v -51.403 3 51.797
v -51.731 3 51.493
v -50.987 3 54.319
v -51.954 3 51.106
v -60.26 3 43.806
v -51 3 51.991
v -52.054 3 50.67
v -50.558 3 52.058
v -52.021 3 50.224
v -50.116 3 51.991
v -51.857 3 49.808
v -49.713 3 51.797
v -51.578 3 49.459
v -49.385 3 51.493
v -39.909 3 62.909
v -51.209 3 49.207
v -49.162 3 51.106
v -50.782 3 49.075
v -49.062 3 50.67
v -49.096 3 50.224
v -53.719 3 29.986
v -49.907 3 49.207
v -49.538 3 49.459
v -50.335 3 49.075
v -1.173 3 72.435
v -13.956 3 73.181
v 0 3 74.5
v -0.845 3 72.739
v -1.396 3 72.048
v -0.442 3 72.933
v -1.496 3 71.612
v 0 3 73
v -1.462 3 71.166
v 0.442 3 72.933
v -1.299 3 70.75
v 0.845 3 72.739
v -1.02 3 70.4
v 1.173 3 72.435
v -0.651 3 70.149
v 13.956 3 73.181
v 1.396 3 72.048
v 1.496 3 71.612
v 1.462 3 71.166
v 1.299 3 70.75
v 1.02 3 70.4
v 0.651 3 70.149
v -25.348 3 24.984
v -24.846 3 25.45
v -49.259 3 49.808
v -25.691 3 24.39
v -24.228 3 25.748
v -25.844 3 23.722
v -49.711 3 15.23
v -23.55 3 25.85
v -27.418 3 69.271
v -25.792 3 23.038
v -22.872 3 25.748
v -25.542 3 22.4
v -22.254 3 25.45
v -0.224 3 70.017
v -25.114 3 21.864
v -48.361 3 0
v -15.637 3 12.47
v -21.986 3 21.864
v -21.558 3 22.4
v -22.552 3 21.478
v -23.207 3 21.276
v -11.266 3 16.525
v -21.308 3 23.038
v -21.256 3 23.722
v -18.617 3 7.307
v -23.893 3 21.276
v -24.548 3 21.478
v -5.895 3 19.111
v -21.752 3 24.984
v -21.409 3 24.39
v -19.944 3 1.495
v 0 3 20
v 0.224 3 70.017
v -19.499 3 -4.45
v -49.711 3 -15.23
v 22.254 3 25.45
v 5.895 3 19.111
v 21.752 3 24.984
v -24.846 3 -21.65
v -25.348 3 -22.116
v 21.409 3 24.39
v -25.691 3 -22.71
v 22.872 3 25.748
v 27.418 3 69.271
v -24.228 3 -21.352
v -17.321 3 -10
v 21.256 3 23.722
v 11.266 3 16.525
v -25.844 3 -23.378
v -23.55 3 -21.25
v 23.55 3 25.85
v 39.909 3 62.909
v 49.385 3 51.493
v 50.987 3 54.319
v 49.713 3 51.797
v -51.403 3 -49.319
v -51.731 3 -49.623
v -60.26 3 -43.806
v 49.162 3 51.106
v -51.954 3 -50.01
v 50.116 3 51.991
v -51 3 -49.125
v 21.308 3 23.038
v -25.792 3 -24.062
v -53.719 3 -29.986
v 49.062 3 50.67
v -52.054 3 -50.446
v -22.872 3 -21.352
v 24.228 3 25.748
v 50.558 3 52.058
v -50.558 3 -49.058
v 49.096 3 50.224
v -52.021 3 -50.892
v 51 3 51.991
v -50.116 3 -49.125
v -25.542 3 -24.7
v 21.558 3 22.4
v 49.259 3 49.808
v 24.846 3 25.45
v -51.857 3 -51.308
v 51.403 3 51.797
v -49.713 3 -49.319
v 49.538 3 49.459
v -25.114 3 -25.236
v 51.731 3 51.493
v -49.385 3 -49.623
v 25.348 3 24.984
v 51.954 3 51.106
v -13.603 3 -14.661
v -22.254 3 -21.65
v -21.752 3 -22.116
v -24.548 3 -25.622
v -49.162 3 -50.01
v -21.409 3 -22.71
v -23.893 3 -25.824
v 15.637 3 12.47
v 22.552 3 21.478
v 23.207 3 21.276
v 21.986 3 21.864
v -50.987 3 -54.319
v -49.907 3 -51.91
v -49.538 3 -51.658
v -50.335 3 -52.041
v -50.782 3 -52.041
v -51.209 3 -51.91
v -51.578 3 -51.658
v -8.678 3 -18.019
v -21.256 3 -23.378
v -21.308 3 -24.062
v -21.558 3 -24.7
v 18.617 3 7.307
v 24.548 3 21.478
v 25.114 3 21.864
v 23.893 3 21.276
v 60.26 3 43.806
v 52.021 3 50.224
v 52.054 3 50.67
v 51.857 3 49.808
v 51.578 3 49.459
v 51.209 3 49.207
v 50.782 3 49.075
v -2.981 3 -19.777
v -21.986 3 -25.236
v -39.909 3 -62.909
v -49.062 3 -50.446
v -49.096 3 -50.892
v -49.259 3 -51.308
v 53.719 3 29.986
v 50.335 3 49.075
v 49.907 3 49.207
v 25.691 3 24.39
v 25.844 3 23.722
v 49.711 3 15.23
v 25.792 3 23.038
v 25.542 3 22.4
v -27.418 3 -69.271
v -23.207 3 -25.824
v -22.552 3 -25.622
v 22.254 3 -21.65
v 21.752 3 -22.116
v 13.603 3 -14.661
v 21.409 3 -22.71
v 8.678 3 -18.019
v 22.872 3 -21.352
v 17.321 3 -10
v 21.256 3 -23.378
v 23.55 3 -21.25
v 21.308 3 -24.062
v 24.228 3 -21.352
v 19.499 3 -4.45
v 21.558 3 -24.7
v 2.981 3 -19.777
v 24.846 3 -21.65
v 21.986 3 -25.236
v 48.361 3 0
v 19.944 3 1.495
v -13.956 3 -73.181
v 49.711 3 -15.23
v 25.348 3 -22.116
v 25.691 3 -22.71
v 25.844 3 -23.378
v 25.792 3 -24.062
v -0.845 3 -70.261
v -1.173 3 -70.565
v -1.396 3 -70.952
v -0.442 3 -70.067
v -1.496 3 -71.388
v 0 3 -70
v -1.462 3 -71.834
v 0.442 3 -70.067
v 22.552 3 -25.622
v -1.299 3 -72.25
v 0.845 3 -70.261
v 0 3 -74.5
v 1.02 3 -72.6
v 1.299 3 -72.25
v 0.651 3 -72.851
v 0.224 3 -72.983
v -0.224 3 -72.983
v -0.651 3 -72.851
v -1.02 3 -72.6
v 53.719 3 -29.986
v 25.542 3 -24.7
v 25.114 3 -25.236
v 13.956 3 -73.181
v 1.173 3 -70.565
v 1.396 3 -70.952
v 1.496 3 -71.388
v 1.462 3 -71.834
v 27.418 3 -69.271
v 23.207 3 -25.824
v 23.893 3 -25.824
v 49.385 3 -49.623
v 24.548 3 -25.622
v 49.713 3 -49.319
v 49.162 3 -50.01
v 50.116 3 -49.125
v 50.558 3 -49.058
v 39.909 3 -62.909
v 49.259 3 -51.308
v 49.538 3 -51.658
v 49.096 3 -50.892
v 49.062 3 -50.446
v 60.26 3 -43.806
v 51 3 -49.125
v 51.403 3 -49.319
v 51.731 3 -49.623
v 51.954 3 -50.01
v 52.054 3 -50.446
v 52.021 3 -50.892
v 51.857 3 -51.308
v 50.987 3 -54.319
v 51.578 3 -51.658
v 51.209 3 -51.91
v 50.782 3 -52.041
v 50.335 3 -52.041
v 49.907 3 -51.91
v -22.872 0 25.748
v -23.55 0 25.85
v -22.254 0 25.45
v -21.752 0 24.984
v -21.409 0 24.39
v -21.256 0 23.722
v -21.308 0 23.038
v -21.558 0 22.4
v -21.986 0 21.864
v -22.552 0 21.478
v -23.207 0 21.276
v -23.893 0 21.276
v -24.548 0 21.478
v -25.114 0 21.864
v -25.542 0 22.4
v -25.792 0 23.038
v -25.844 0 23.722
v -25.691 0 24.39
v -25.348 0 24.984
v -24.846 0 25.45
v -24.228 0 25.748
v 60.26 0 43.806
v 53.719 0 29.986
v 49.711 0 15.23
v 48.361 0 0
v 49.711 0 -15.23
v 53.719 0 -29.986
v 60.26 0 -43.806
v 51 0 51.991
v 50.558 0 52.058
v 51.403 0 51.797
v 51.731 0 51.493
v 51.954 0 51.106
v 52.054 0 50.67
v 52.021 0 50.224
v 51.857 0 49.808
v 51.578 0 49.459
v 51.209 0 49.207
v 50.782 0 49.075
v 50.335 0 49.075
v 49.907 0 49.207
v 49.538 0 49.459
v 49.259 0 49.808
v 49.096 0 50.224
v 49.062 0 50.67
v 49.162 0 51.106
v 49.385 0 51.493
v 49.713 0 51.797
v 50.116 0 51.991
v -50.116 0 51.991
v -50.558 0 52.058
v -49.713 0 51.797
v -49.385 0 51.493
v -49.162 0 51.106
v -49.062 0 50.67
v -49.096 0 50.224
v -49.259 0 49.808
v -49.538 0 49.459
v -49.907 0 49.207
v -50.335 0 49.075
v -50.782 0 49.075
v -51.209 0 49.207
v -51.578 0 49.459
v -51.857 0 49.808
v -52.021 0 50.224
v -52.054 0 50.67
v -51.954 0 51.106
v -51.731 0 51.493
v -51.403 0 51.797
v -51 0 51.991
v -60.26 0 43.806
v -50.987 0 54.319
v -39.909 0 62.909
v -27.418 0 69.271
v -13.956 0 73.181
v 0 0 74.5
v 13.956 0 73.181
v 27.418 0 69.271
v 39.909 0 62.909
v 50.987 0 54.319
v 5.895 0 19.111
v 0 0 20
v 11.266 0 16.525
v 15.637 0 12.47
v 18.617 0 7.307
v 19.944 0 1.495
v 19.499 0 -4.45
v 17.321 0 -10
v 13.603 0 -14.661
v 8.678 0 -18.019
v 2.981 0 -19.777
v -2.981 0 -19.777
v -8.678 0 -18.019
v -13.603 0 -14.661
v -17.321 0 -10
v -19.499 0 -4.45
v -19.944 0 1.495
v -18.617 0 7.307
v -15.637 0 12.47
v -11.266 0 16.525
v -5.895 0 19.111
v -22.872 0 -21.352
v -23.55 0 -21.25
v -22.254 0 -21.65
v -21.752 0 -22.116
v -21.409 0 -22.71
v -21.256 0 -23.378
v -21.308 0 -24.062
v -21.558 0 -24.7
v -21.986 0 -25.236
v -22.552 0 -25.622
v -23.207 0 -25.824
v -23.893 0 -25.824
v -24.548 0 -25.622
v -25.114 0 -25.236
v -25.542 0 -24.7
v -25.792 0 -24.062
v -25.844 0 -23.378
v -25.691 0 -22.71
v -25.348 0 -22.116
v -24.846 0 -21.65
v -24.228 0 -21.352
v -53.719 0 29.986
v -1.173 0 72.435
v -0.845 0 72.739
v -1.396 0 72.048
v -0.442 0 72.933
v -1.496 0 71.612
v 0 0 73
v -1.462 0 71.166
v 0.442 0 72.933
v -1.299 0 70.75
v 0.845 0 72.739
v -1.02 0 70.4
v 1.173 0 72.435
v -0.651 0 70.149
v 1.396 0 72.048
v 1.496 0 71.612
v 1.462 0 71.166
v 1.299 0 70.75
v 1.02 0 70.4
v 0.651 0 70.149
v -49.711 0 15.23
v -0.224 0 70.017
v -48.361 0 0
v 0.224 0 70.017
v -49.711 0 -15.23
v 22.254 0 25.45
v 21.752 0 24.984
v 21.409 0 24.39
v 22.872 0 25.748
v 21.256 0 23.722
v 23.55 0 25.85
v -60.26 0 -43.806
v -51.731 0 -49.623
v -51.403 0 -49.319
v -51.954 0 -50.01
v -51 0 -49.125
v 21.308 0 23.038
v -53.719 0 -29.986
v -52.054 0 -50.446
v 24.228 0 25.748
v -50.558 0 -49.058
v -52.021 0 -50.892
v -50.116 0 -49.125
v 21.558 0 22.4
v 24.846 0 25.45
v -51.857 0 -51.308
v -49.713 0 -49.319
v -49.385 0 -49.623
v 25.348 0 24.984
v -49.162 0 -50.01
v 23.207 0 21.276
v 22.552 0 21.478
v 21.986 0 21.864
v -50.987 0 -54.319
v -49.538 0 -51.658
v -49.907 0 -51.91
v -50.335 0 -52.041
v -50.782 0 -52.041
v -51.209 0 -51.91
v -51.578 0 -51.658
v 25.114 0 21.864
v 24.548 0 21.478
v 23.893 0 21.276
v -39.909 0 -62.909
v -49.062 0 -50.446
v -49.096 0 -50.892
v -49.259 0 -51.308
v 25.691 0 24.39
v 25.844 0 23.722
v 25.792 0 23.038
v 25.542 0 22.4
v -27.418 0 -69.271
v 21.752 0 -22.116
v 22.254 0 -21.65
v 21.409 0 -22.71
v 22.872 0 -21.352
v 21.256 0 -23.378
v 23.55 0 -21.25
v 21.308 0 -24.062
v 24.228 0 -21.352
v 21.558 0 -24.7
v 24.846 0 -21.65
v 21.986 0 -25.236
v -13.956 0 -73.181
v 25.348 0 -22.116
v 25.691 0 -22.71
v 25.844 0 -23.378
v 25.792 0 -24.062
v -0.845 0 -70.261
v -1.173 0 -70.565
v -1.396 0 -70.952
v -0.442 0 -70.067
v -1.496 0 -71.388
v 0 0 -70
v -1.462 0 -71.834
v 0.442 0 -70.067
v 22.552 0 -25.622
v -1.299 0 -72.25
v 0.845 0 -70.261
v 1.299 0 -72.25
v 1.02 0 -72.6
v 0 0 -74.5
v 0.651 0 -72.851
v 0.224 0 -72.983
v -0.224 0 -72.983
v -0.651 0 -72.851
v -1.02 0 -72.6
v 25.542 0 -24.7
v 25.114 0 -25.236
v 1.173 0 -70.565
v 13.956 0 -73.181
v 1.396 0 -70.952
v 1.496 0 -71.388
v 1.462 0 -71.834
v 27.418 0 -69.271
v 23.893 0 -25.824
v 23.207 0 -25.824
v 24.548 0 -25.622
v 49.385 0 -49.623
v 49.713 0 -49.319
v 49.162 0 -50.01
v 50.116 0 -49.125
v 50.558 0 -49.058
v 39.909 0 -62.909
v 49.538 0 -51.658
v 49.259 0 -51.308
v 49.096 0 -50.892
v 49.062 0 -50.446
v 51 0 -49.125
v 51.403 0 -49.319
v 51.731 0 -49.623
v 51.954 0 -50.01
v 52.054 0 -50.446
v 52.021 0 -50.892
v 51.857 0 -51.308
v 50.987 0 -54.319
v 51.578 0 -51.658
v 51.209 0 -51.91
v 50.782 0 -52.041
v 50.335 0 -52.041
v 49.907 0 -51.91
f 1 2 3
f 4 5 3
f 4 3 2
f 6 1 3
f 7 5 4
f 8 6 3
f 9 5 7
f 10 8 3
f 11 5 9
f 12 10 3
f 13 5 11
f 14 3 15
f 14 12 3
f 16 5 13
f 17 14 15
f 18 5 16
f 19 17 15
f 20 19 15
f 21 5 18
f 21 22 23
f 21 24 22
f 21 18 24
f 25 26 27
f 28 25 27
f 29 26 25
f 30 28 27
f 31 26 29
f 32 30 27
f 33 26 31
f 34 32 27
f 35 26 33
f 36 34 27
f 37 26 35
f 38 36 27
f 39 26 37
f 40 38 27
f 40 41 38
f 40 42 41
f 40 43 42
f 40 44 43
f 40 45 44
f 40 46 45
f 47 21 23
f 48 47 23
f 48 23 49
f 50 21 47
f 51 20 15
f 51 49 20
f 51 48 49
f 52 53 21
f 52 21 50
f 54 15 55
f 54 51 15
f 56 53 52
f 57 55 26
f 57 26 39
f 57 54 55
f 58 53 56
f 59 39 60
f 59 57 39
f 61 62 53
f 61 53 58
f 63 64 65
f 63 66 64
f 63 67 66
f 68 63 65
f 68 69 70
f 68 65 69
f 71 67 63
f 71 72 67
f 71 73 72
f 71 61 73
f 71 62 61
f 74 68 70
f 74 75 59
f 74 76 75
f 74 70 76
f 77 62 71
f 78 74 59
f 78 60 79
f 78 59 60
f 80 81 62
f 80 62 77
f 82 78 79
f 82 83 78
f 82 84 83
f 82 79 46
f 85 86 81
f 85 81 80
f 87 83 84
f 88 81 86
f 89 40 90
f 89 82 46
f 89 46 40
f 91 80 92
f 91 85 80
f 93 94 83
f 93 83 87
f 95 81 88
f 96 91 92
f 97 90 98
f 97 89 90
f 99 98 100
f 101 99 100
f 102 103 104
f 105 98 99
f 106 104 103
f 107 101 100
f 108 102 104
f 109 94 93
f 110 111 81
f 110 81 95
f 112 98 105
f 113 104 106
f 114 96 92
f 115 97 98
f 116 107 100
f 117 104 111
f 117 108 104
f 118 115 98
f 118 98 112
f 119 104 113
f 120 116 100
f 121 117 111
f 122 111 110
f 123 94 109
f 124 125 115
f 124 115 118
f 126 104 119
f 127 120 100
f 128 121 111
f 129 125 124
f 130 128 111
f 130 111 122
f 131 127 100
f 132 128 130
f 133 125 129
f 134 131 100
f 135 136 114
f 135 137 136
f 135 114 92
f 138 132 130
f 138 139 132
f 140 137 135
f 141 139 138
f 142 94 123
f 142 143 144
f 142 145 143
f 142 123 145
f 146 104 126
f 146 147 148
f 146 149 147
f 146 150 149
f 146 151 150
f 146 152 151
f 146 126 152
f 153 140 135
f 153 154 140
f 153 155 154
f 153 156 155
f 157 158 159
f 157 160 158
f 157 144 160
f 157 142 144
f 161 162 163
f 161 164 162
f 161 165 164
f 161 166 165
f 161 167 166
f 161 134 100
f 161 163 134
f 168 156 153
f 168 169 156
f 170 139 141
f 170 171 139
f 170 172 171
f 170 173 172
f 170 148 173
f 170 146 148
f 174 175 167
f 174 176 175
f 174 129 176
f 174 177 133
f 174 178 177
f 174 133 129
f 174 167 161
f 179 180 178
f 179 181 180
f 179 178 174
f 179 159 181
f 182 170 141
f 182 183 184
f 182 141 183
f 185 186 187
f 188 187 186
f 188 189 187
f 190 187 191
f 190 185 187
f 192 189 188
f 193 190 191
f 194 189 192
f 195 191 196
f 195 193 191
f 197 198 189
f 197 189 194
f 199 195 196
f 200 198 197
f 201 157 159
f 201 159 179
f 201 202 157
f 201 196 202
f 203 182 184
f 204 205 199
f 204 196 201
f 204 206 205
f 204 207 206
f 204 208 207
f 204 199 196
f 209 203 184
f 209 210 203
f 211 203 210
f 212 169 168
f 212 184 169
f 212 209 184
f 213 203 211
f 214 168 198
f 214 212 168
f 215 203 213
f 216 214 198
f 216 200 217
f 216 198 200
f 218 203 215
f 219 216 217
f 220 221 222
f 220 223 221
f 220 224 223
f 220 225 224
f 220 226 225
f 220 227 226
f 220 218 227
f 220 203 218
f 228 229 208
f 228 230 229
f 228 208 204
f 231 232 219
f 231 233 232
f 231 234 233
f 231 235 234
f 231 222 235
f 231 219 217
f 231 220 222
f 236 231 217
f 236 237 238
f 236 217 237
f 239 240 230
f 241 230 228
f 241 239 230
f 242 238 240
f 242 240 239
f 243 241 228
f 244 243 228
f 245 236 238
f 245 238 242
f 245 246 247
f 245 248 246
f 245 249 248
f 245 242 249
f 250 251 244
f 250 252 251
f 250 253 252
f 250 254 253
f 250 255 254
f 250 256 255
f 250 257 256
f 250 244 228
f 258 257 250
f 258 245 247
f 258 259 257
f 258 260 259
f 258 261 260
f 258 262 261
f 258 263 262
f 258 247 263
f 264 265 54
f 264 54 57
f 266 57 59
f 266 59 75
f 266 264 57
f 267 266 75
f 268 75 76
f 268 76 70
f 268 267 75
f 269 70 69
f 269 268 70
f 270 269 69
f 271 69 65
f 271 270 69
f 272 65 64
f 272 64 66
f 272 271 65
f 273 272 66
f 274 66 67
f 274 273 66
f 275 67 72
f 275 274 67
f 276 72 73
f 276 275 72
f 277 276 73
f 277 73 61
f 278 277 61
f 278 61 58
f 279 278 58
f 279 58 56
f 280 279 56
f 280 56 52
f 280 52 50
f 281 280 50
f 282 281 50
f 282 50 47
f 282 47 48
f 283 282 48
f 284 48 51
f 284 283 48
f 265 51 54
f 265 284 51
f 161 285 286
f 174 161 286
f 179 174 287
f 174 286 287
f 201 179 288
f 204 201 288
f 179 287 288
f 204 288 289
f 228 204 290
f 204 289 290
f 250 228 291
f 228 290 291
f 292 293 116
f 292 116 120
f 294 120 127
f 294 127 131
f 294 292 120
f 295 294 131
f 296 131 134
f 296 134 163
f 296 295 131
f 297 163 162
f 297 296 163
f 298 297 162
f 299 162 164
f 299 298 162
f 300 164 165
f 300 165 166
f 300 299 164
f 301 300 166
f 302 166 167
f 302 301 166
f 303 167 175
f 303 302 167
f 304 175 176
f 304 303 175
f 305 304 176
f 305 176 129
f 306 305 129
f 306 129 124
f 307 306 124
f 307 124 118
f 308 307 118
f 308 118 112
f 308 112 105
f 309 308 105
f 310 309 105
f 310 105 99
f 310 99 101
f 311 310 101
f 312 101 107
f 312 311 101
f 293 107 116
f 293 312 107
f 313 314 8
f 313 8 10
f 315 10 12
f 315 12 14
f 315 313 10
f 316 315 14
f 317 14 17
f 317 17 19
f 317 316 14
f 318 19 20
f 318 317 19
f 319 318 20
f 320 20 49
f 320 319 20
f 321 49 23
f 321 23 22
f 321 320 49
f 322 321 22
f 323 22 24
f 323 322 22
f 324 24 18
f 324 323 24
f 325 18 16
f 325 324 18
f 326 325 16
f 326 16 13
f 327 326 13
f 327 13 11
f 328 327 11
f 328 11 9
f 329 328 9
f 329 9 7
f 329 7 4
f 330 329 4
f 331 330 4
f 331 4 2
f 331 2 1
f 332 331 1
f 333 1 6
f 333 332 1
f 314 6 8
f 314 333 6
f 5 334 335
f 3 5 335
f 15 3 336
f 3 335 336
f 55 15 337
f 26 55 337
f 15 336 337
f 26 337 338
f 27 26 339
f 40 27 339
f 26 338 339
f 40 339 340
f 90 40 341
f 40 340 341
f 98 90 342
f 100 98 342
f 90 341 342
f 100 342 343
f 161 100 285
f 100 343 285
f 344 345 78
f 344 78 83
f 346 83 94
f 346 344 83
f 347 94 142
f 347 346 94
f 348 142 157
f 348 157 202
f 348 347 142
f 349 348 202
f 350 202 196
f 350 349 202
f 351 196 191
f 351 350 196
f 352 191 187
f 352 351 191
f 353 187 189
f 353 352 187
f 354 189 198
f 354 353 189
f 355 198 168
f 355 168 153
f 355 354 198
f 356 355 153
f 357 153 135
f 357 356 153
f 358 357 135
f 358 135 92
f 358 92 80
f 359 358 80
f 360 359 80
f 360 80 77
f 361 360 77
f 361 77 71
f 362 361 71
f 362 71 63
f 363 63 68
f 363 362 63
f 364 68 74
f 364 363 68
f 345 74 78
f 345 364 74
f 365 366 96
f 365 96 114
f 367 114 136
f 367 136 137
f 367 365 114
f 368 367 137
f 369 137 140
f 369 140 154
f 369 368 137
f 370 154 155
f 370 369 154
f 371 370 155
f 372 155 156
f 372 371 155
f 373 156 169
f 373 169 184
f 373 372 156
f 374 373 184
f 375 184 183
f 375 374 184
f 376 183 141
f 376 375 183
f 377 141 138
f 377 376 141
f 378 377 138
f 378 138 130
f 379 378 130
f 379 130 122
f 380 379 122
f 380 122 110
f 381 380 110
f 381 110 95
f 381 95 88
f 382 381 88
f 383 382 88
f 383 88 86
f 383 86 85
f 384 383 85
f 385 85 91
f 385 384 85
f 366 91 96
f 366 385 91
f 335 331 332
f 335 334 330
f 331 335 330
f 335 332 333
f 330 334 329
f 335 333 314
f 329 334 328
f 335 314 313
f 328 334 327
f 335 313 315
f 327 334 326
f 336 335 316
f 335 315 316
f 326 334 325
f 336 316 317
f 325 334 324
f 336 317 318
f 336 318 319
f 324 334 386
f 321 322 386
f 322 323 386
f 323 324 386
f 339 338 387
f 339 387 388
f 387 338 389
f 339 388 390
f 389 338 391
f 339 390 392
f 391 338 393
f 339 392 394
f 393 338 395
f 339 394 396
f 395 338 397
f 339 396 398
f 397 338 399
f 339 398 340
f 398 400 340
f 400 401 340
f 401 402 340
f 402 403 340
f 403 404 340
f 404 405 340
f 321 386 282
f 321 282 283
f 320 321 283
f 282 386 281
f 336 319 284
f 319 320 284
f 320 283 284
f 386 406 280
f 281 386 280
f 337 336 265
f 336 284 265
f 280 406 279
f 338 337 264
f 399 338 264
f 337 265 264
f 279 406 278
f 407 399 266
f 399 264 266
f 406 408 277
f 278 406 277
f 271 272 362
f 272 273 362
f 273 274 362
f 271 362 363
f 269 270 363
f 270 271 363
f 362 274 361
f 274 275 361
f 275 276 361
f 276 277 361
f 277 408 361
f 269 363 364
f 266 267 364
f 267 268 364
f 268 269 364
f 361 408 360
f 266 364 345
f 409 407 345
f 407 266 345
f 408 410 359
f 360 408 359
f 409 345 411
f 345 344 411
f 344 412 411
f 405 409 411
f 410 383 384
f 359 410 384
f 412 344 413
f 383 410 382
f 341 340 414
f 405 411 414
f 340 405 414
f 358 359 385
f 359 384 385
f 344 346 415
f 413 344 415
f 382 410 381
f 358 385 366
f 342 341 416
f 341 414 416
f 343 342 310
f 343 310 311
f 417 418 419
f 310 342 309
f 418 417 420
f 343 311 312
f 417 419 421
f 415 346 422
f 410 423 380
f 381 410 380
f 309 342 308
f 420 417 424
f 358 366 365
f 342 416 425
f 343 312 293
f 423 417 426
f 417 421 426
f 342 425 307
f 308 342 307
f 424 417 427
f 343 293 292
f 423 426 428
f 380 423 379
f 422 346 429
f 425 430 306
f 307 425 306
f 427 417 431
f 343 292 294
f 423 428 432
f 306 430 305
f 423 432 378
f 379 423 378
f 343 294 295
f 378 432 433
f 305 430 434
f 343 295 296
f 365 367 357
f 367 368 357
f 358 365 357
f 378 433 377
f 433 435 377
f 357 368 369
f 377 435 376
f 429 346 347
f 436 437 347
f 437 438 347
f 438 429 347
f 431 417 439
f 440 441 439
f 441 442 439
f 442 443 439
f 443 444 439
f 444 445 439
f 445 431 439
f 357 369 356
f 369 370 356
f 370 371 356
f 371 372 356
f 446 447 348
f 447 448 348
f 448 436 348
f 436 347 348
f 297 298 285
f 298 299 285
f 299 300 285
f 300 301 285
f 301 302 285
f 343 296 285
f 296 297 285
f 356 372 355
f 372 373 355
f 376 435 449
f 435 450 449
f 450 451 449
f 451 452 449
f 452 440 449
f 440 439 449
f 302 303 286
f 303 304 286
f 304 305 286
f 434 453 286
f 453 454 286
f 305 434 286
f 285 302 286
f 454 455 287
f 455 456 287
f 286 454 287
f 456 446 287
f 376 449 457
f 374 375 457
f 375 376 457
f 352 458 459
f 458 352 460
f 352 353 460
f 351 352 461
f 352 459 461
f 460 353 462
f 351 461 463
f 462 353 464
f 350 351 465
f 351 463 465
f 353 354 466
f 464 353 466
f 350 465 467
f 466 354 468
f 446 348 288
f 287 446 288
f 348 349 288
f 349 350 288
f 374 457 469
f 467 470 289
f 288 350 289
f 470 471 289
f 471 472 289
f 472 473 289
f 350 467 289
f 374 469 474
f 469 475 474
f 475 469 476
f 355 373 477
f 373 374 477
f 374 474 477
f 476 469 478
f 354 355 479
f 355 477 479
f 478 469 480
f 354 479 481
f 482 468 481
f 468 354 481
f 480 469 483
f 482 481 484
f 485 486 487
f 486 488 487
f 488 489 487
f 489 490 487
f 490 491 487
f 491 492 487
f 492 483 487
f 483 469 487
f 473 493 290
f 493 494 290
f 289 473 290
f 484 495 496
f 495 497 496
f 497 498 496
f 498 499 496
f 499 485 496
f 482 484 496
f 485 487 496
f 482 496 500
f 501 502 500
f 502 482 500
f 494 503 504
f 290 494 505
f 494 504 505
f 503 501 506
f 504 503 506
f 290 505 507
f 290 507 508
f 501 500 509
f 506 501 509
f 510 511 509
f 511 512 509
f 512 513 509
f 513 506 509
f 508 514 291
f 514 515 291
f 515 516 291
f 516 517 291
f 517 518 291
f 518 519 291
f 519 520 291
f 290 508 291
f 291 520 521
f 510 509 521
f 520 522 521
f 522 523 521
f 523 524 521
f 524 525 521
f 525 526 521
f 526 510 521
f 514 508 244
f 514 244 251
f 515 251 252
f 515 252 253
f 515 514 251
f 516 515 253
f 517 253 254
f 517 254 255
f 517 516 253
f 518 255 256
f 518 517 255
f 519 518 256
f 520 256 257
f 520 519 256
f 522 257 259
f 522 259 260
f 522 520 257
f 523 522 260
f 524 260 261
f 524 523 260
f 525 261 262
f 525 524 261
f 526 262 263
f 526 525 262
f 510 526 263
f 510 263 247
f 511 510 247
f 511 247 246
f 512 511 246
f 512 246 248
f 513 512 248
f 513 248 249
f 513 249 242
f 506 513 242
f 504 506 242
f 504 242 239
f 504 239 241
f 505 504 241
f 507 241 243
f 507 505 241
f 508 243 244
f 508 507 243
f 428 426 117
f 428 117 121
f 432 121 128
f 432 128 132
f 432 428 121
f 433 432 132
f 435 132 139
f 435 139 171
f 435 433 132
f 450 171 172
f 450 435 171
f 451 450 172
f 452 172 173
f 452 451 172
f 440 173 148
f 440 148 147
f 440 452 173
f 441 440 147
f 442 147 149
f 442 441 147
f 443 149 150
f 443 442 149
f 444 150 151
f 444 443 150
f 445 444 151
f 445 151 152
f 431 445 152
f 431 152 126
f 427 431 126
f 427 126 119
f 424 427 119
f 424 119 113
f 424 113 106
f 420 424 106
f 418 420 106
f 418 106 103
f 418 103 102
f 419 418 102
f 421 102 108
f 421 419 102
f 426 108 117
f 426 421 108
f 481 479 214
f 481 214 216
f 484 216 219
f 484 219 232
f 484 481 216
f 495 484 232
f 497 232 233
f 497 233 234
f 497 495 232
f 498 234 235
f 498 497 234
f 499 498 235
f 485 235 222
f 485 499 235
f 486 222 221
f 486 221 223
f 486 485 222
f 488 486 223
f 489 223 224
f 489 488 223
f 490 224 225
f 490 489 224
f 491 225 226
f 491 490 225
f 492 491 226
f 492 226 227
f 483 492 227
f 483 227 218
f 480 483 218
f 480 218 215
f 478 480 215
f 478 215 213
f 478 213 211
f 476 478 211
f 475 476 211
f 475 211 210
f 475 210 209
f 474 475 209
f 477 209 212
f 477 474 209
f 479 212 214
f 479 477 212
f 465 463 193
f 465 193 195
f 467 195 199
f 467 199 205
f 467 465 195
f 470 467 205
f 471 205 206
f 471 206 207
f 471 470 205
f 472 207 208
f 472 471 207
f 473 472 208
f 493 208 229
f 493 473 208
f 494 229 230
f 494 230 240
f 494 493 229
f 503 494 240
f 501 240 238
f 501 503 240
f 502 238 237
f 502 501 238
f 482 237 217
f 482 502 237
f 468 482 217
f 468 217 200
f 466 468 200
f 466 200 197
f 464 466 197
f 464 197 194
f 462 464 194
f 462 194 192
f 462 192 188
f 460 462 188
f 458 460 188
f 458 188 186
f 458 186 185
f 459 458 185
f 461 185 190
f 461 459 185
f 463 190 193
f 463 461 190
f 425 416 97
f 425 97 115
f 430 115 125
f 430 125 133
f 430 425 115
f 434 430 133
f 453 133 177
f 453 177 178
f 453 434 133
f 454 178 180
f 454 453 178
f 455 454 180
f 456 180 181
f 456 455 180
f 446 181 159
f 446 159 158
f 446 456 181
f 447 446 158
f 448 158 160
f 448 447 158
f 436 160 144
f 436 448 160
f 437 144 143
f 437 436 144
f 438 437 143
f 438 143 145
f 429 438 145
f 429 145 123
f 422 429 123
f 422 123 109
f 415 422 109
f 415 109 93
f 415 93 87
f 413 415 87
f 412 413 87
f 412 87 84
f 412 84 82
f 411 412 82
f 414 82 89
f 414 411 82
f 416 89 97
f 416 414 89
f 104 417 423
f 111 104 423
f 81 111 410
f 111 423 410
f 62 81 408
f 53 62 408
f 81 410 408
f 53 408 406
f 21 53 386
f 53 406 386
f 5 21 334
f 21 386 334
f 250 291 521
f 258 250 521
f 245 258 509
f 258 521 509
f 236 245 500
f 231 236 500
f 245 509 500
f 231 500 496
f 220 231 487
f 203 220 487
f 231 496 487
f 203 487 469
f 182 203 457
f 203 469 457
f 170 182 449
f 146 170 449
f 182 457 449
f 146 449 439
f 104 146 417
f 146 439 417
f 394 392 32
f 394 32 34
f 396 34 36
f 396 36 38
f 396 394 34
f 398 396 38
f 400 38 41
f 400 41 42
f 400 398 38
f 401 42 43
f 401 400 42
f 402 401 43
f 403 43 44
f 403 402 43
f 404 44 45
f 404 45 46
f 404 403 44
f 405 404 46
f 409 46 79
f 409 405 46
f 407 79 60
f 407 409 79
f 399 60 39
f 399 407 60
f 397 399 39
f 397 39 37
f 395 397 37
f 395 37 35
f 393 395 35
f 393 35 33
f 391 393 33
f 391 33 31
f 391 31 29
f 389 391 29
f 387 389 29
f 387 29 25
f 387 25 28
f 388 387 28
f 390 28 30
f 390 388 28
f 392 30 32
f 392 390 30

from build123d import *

# Parameters (mm, degrees)
SKETCH_2_R      = 1.5
SKETCH_2_R_2    = 20
SKETCH_2_R_3    = 2.3
EXTRUDE_1_DEPTH = 3


with BuildPart() as part:
    # 草图2 → 凸台-拉伸1 (new body)
    with BuildSketch(Plane(origin=(0, 0, 0), x_dir=(1, 0, 0), z_dir=(0, 1, 0))):
        with BuildLine():
            ThreePointArc((60.260378076, 43.805671256), (0, 74.5), (-60.260378076, 43.805671256))
            ThreePointArc((-60.260378076, 43.805671256), (-48.360726818, 0), (-60.260378076, -43.805671256))
            ThreePointArc((-60.260378076, -43.805671256), (0, -74.5), (60.260378076, -43.805671256))
            ThreePointArc((60.260378076, -43.805671256), (48.360726818, 0), (60.260378076, 43.805671256))
        make_face()
        with Locations(Location((0, 71.5, 0), (0, 0, 270))):
            Circle(SKETCH_2_R, mode=Mode.SUBTRACT)
        with Locations(Location((50.558134855, 50.558134855, 0), (0, 0, 270))):
            Circle(SKETCH_2_R, mode=Mode.SUBTRACT)
        with Locations(Location((50.558134855, -50.558134855, 0), (0, 0, 270))):
            Circle(SKETCH_2_R, mode=Mode.SUBTRACT)
        with Locations(Location((0, -71.5, 0), (0, 0, 270))):
            Circle(SKETCH_2_R, mode=Mode.SUBTRACT)
        with Locations(Location((-50.558134855, -50.558134855, 0), (0, 0, 270))):
            Circle(SKETCH_2_R, mode=Mode.SUBTRACT)
        with Locations(Location((-50.558134855, 50.558134855, 0), (0, 0, 270))):
            Circle(SKETCH_2_R, mode=Mode.SUBTRACT)
        with Locations(Location((0, 0, 0), (0, 0, 270))):
            Circle(SKETCH_2_R_2, mode=Mode.SUBTRACT)
        with Locations(Location((-23.55, 23.55, 0), (0, 0, 270))):
            Circle(SKETCH_2_R_3, mode=Mode.SUBTRACT)
        with Locations(Location((23.55, 23.55, 0), (0, 0, 270))):
            Circle(SKETCH_2_R_3, mode=Mode.SUBTRACT)
        with Locations(Location((23.55, -23.55, 0), (0, 0, 270))):
            Circle(SKETCH_2_R_3, mode=Mode.SUBTRACT)
        with Locations(Location((-23.55, -23.55, 0), (0, 0, 270))):
            Circle(SKETCH_2_R_3, mode=Mode.SUBTRACT)
    extrude(amount=EXTRUDE_1_DEPTH)


solid = part.part
